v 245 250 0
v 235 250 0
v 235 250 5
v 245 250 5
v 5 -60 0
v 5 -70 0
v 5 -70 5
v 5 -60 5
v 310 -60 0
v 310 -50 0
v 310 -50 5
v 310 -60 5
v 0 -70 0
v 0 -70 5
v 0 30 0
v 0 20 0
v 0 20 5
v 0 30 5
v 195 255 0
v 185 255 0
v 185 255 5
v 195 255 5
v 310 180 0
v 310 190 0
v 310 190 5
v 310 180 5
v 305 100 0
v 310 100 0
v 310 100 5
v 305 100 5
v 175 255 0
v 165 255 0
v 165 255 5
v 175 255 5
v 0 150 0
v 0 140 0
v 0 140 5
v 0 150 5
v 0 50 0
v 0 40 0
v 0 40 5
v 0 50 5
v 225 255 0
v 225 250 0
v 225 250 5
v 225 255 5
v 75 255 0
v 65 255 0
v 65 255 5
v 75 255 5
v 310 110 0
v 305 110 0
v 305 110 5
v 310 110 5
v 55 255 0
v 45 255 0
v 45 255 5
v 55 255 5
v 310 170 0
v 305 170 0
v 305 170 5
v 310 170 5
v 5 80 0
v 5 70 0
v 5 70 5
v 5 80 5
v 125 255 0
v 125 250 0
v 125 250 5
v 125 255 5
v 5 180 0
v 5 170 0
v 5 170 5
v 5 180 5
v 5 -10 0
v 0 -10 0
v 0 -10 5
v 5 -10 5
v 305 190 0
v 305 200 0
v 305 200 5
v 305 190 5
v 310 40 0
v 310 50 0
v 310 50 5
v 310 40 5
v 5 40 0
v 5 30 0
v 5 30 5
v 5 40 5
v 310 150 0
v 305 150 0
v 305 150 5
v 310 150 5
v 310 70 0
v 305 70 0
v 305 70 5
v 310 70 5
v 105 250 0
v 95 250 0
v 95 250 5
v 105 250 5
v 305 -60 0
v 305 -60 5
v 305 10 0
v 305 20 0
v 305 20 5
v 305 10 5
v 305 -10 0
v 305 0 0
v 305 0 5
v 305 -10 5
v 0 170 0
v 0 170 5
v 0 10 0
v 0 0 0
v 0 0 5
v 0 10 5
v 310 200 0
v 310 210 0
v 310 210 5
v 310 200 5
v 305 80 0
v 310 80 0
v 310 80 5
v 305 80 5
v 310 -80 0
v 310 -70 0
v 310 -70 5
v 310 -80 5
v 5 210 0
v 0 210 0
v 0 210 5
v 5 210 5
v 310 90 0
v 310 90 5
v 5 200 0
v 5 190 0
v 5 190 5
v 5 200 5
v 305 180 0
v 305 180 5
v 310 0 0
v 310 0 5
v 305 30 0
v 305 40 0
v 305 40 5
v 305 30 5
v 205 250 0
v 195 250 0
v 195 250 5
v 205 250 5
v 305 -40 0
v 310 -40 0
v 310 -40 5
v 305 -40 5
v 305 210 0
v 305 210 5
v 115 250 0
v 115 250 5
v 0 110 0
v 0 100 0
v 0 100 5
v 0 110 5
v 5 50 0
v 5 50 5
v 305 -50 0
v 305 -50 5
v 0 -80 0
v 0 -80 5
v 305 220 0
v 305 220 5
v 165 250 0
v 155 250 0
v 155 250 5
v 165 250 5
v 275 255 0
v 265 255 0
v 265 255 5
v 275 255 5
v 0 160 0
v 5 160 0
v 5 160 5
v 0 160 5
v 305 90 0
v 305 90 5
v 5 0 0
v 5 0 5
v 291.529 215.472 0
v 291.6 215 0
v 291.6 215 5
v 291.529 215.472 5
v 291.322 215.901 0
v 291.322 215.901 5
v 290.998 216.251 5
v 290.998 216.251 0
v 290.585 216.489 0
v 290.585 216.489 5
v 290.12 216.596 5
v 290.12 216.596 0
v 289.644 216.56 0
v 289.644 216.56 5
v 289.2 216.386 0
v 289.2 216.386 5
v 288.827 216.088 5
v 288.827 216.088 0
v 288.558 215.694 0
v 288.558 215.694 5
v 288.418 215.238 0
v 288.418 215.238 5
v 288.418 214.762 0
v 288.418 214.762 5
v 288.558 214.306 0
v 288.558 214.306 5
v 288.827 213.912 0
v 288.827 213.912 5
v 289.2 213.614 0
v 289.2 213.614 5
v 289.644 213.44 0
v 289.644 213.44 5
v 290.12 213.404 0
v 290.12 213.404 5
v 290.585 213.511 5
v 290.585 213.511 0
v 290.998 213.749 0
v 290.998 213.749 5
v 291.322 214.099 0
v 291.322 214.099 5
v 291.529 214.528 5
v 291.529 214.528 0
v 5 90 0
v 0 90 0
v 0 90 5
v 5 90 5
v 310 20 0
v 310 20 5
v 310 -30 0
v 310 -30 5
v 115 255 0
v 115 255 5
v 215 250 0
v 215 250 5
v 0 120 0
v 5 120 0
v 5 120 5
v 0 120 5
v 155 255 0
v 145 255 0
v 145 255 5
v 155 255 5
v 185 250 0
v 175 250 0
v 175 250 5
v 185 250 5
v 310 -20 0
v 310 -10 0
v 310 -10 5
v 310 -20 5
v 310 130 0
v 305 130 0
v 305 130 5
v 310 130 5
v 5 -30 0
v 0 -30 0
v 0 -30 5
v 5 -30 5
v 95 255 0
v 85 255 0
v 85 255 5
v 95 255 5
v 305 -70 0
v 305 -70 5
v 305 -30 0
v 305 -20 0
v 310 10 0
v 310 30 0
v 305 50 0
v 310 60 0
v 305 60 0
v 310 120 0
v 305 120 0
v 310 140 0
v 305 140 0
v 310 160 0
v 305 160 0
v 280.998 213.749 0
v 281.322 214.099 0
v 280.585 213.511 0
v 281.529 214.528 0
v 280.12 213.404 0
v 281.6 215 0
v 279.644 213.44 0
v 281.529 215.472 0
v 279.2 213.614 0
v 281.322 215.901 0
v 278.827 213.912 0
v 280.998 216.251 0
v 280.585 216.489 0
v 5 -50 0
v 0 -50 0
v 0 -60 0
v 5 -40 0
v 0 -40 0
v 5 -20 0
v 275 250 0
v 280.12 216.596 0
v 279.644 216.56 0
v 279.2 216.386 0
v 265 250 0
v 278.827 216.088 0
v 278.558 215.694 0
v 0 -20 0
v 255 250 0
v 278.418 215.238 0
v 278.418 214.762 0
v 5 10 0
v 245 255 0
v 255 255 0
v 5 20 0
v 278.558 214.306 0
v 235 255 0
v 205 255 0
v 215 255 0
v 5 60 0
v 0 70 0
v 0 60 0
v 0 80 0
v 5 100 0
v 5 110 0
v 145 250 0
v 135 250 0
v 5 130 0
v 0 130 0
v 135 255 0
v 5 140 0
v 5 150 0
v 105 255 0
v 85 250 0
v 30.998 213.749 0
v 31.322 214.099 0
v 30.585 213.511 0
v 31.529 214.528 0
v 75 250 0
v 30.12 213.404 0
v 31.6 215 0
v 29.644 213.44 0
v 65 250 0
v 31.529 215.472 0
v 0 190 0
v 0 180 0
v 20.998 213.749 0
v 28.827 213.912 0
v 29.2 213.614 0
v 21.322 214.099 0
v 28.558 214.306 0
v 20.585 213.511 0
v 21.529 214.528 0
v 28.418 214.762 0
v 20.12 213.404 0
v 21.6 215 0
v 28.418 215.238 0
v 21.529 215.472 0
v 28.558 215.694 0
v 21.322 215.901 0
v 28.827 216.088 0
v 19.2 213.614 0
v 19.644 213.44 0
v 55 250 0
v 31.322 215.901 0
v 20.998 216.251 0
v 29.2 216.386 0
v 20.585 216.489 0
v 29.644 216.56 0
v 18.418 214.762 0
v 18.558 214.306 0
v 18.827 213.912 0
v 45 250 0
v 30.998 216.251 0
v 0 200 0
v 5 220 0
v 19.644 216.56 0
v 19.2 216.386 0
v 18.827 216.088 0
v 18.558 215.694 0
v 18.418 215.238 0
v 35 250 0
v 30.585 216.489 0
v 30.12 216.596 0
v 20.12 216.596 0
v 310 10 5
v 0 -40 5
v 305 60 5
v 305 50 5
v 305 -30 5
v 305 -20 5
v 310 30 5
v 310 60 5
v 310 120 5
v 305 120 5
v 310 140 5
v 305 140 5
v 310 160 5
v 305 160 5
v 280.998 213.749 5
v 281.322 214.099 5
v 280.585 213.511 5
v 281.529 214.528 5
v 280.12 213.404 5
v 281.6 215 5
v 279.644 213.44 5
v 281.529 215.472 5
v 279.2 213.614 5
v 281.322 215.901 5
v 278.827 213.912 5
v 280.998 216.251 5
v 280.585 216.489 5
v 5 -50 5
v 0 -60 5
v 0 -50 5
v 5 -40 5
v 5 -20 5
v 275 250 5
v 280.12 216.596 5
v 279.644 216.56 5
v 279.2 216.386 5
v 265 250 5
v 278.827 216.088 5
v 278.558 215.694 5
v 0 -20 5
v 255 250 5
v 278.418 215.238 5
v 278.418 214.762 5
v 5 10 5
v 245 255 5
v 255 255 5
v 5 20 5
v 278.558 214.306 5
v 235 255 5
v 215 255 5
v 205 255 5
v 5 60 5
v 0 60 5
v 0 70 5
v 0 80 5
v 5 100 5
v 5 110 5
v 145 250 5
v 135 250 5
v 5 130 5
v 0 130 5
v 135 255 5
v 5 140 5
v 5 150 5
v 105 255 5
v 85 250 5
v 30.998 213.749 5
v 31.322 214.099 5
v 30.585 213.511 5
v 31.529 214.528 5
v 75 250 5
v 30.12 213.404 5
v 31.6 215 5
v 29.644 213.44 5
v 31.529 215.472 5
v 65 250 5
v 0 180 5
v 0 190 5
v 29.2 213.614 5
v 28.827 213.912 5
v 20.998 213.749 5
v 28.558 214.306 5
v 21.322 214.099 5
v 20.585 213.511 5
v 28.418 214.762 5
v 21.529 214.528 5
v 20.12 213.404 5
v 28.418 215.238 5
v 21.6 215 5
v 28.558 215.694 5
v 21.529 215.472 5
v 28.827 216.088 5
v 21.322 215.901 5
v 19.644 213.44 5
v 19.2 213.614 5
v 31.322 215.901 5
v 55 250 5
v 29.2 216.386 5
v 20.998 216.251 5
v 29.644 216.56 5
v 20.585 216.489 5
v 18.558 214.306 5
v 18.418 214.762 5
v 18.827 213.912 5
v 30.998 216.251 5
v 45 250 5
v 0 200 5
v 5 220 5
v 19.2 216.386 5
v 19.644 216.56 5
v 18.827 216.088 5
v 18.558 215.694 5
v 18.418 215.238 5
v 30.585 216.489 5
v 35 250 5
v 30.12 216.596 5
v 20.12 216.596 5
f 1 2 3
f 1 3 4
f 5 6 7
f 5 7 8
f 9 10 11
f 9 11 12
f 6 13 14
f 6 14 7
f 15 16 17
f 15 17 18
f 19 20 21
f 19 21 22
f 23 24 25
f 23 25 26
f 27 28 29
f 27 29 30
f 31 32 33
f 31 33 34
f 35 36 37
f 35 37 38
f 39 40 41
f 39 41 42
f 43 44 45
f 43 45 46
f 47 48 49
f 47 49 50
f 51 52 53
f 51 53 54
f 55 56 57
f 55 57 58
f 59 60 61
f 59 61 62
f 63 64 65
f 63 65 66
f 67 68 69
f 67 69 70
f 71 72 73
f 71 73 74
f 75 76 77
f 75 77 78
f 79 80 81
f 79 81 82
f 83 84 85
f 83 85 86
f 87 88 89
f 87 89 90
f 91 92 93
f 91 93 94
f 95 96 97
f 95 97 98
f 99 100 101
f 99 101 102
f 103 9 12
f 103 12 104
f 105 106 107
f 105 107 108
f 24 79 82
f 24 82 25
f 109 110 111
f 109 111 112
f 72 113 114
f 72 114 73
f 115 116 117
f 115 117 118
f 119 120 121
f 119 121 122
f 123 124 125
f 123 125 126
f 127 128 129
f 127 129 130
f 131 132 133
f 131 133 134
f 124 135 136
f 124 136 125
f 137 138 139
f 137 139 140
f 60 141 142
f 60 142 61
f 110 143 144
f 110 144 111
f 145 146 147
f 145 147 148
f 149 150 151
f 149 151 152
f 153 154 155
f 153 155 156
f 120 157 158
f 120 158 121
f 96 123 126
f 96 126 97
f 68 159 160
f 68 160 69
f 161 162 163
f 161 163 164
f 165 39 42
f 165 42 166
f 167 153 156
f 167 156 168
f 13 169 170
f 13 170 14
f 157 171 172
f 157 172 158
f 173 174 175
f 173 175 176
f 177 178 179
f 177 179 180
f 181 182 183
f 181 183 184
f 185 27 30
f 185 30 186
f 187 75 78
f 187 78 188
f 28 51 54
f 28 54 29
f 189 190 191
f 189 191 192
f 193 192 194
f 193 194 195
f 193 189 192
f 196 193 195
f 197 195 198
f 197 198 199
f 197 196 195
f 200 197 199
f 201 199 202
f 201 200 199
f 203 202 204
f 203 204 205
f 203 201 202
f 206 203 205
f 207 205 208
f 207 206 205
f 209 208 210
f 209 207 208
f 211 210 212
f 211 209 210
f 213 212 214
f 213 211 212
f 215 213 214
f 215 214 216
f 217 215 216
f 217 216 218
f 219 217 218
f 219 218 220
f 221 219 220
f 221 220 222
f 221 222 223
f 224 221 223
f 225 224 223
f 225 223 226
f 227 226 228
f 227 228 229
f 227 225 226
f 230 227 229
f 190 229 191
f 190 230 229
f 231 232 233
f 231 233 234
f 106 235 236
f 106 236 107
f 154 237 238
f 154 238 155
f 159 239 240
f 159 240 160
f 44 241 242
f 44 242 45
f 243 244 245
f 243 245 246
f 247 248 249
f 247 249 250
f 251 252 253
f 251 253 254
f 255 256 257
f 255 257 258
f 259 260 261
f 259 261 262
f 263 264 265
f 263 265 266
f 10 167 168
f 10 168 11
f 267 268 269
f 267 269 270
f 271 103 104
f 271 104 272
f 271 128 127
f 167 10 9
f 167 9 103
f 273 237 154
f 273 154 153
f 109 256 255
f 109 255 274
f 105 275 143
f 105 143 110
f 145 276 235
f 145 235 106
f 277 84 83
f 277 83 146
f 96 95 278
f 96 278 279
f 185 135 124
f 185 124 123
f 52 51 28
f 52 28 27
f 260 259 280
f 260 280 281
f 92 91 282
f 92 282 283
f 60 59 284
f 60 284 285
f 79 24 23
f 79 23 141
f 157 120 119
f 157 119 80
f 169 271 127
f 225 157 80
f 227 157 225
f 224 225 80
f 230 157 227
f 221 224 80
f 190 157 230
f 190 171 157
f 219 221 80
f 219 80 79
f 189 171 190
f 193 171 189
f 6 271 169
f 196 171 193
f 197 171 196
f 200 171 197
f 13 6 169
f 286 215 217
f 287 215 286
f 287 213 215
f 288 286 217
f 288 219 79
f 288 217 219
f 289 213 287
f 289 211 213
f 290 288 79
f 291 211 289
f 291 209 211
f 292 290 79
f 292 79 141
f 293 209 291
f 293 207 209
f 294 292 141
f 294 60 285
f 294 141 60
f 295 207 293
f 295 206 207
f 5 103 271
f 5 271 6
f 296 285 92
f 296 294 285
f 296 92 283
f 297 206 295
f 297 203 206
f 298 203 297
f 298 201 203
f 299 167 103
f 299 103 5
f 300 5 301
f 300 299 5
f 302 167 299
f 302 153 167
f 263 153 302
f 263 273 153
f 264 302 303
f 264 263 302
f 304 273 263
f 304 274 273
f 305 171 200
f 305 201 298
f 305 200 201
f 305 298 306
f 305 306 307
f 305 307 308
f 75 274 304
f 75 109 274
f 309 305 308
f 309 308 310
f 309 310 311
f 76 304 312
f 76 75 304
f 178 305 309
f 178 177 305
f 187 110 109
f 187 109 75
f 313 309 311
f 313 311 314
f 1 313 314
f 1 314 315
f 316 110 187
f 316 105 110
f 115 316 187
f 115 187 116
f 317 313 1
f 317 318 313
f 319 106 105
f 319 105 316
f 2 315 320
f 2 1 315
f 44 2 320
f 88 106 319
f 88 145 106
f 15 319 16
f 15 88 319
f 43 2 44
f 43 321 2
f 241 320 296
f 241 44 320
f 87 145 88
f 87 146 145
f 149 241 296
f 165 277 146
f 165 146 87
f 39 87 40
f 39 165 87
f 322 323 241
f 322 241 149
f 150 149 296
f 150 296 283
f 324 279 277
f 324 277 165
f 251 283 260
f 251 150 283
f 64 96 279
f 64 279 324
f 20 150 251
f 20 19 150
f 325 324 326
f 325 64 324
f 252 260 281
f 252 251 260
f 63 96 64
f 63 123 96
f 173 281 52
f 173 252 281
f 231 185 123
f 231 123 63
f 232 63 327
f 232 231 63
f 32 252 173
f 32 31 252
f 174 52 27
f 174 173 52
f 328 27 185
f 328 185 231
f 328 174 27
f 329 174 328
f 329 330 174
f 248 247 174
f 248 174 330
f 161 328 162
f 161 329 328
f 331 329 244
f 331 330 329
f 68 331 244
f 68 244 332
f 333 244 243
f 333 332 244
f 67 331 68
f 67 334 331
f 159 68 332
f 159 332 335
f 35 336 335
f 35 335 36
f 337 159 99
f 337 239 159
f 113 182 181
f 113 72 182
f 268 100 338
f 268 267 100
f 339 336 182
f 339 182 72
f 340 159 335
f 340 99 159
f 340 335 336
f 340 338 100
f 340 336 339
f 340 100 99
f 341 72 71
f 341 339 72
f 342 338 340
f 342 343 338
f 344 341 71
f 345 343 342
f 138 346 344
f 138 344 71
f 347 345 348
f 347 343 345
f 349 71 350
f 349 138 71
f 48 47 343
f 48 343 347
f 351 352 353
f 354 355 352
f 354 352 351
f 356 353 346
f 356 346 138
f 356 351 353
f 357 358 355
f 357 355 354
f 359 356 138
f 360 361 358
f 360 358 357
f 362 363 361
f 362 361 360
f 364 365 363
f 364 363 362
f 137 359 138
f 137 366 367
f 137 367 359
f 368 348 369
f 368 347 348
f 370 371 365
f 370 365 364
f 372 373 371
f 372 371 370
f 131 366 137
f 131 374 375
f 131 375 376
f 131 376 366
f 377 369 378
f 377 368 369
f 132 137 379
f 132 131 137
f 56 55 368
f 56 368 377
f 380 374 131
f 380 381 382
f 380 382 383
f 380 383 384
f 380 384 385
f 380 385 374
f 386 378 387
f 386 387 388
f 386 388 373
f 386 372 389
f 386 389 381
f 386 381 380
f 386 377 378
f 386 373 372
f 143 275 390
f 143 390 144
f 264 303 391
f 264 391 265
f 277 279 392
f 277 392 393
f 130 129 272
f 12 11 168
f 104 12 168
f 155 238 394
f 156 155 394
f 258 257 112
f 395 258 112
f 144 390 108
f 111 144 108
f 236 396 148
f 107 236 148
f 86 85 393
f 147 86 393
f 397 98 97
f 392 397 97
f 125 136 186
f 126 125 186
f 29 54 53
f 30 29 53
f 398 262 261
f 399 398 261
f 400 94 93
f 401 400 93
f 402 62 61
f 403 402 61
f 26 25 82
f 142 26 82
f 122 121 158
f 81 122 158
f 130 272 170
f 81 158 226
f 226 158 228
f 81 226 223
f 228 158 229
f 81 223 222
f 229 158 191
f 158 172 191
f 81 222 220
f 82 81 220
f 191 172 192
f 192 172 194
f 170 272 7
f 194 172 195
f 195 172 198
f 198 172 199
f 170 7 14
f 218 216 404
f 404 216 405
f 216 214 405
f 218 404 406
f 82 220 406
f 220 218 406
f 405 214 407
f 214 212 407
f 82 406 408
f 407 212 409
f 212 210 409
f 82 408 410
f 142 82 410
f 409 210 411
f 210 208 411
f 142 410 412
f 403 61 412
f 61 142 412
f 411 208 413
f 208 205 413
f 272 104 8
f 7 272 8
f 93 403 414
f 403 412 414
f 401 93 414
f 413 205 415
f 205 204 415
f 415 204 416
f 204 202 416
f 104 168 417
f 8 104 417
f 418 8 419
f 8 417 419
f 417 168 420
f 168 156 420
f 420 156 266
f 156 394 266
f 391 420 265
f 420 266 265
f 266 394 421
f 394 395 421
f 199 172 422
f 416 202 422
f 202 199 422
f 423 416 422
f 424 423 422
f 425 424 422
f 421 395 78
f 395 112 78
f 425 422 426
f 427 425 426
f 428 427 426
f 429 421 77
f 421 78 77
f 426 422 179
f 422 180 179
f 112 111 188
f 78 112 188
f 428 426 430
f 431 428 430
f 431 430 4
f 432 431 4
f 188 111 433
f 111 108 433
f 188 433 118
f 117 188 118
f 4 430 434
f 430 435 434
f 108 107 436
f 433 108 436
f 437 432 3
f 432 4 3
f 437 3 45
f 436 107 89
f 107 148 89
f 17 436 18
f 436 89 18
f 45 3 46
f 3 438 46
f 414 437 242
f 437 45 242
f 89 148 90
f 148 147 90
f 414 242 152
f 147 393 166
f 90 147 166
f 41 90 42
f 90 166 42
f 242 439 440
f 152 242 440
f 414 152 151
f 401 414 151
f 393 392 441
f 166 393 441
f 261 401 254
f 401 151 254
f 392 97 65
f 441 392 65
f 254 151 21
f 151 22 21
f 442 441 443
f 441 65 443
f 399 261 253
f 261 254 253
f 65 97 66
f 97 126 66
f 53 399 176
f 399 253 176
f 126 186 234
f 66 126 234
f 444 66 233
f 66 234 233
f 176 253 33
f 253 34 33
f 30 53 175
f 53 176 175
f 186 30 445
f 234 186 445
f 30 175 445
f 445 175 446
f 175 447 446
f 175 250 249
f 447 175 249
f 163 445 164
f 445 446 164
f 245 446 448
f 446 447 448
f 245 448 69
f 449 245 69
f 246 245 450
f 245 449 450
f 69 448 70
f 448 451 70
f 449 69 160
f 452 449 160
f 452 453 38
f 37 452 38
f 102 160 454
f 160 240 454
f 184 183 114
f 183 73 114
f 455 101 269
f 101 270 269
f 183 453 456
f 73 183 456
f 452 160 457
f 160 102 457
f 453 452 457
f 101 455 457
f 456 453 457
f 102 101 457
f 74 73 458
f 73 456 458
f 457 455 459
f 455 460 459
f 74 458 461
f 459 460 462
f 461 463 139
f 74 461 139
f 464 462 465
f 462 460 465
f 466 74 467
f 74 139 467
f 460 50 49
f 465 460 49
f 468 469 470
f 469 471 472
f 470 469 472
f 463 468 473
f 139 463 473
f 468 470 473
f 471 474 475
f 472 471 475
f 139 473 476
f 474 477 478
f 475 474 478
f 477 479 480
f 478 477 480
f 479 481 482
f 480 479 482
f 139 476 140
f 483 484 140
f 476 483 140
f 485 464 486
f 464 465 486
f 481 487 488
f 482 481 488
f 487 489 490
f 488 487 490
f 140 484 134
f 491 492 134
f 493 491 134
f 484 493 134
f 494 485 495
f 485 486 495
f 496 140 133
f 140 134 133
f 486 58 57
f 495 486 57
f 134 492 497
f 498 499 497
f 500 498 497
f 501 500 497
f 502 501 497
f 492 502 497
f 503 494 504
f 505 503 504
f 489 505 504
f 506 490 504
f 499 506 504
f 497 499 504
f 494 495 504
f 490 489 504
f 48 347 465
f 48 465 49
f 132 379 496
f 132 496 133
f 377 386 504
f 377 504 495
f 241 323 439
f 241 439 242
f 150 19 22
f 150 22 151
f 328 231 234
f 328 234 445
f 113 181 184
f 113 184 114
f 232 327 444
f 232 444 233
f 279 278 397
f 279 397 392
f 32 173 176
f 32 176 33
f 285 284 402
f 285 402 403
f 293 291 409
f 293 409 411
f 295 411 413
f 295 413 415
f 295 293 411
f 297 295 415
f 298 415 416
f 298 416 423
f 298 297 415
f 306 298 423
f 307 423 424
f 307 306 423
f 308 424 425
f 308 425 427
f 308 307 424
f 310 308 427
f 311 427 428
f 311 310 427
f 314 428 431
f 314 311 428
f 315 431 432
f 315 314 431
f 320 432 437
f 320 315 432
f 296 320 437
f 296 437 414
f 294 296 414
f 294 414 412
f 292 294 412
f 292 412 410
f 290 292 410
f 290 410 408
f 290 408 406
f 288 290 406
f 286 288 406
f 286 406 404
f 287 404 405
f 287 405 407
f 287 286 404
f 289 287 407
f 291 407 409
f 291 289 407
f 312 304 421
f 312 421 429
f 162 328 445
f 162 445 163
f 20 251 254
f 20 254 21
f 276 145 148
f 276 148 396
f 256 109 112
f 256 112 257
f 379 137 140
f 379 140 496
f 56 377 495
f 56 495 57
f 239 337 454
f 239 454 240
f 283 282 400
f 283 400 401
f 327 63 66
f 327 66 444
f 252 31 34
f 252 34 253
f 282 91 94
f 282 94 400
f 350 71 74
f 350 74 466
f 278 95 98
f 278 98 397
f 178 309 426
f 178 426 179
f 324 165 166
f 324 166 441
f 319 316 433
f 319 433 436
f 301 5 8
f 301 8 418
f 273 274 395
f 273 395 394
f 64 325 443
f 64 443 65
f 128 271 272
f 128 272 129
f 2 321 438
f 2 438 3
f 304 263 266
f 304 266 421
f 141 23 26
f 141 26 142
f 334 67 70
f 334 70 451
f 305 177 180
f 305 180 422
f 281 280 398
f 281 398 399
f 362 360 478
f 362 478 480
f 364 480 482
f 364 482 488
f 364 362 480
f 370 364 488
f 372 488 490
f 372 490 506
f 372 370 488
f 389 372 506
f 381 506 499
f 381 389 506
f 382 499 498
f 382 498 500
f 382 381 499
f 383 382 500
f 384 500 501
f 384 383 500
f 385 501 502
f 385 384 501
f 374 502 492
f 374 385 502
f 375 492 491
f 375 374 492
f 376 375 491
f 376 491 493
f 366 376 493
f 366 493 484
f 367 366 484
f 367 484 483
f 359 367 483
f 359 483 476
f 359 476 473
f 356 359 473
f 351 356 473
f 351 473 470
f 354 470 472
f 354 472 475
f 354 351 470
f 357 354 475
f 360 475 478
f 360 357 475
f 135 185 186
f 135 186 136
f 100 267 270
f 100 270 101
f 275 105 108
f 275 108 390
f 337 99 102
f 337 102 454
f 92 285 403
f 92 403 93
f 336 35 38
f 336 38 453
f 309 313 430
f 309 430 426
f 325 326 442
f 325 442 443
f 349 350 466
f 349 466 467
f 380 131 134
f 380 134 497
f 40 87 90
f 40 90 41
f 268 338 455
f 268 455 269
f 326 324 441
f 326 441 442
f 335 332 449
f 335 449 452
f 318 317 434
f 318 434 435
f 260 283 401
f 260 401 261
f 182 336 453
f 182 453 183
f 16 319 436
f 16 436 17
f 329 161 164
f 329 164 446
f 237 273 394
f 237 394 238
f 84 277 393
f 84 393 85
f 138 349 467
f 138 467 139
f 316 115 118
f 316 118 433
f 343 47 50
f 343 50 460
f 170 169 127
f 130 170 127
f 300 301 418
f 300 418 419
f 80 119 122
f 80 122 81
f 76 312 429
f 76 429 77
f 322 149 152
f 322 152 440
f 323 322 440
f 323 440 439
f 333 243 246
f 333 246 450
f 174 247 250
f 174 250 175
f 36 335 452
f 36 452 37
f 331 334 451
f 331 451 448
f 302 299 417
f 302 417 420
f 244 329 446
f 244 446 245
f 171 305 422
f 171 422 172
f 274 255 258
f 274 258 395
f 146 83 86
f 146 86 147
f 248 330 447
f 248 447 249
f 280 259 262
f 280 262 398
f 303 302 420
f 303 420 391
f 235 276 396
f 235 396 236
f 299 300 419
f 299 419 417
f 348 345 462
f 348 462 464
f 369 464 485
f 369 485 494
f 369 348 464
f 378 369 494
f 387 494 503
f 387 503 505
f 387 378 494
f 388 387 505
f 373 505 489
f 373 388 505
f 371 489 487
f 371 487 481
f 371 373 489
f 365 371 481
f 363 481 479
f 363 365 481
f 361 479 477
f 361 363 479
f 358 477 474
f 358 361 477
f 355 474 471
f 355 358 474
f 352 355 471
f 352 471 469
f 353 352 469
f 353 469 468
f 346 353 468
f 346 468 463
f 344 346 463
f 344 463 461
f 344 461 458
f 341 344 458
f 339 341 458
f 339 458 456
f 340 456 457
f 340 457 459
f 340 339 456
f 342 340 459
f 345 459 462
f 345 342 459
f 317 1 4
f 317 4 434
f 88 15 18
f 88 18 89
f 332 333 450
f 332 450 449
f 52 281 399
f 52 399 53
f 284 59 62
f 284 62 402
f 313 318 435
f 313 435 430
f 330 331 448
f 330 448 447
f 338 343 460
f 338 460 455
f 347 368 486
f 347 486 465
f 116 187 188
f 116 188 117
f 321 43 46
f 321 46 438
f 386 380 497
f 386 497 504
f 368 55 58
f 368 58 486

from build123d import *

# Parameters (mm, degrees)
SKIZZE1_R                       = 1.6
AUFSATZ_LINEAR_AUSTRAGEN1_DEPTH = 5


with BuildPart() as part:
    # Skizze1 → Aufsatz-Linear austragen1 (new body)
    with BuildSketch(Plane.XY):
        Polygon((5, 10), (5, 20), (0, 20), (0, 30), (5, 30), (5, 40), (0, 40), (0, 50), (5, 50), (5, 60), (0, 60), (0, 70), (5, 70), (5, 80), (0, 80), (0, 90), (5, 90), (5, 100), (0, 100), (0, 110), (5, 110), (5, 120), (0, 120), (0, 130), (5, 130), (5, 140), (0, 140), (0, 150), (5, 150), (5, 160), (0, 160), (0, 170), (5, 170), (5, 180), (0, 180), (0, 190), (5, 190), (5, 200), (0, 200), (0, 210), (5, 210), (5, 220), (35, 250), (45, 250), (45, 255), (55, 255), (55, 250), (65, 250), (65, 255), (75, 255), (75, 250), (85, 250), (85, 255), (95, 255), (95, 250), (105, 250), (105, 255), (115, 255), (115, 250), (125, 250), (125, 255), (135, 255), (135, 250), (145, 250), (145, 255), (155, 255), (155, 250), (165, 250), (165, 255), (175, 255), (175, 250), (185, 250), (185, 255), (195, 255), (195, 250), (205, 250), (205, 255), (215, 255), (215, 250), (225, 250), (225, 255), (235, 255), (235, 250), (245, 250), (245, 255), (255, 255), (255, 250), (265, 250), (265, 255), (275, 255), (275, 250), (305, 220), (305, 210), (310, 210), (310, 200), (305, 200), (305, 190), (310, 190), (310, 180), (305, 180), (305, 170), (310, 170), (310, 160), (305, 160), (305, 150), (310, 150), (310, 140), (305, 140), (305, 130), (310, 130), (310, 120), (305, 120), (305, 110), (310, 110), (310, 100), (305, 100), (305, 90), (310, 90), (310, 80), (305, 80), (305, 70), (310, 70), (310, 60), (305, 60), (305, 50), (310, 50), (310, 40), (305, 40), (305, 30), (310, 30), (310, 20), (305, 20), (305, 10), (310, 10), (310, 0), (305, 0), (305, -10), (310, -10), (310, -20), (305, -20), (305, -30), (310, -30), (310, -40), (305, -40), (305, -50), (310, -50), (310, -60), (305, -60), (305, -70), (310, -70), (310, -80), (305, -80), (5, -80), (0, -80), (0, -70), (5, -70), (5, -60), (0, -60), (0, -50), (5, -50), (5, -40), (0, -40), (0, -30), (5, -30), (5, -20), (0, -20), (0, -10), (5, -10), (5, 0), (0, 0), (0, 10), align=None)
        with Locations((20, 215)):
            Circle(SKIZZE1_R, mode=Mode.SUBTRACT)
        with Locations((30, 215)):
            Circle(SKIZZE1_R, mode=Mode.SUBTRACT)
        with Locations((290, 215)):
            Circle(SKIZZE1_R, mode=Mode.SUBTRACT)
        with Locations((280, 215)):
            Circle(SKIZZE1_R, mode=Mode.SUBTRACT)
    extrude(amount=AUFSATZ_LINEAR_AUSTRAGEN1_DEPTH)


solid = part.part
